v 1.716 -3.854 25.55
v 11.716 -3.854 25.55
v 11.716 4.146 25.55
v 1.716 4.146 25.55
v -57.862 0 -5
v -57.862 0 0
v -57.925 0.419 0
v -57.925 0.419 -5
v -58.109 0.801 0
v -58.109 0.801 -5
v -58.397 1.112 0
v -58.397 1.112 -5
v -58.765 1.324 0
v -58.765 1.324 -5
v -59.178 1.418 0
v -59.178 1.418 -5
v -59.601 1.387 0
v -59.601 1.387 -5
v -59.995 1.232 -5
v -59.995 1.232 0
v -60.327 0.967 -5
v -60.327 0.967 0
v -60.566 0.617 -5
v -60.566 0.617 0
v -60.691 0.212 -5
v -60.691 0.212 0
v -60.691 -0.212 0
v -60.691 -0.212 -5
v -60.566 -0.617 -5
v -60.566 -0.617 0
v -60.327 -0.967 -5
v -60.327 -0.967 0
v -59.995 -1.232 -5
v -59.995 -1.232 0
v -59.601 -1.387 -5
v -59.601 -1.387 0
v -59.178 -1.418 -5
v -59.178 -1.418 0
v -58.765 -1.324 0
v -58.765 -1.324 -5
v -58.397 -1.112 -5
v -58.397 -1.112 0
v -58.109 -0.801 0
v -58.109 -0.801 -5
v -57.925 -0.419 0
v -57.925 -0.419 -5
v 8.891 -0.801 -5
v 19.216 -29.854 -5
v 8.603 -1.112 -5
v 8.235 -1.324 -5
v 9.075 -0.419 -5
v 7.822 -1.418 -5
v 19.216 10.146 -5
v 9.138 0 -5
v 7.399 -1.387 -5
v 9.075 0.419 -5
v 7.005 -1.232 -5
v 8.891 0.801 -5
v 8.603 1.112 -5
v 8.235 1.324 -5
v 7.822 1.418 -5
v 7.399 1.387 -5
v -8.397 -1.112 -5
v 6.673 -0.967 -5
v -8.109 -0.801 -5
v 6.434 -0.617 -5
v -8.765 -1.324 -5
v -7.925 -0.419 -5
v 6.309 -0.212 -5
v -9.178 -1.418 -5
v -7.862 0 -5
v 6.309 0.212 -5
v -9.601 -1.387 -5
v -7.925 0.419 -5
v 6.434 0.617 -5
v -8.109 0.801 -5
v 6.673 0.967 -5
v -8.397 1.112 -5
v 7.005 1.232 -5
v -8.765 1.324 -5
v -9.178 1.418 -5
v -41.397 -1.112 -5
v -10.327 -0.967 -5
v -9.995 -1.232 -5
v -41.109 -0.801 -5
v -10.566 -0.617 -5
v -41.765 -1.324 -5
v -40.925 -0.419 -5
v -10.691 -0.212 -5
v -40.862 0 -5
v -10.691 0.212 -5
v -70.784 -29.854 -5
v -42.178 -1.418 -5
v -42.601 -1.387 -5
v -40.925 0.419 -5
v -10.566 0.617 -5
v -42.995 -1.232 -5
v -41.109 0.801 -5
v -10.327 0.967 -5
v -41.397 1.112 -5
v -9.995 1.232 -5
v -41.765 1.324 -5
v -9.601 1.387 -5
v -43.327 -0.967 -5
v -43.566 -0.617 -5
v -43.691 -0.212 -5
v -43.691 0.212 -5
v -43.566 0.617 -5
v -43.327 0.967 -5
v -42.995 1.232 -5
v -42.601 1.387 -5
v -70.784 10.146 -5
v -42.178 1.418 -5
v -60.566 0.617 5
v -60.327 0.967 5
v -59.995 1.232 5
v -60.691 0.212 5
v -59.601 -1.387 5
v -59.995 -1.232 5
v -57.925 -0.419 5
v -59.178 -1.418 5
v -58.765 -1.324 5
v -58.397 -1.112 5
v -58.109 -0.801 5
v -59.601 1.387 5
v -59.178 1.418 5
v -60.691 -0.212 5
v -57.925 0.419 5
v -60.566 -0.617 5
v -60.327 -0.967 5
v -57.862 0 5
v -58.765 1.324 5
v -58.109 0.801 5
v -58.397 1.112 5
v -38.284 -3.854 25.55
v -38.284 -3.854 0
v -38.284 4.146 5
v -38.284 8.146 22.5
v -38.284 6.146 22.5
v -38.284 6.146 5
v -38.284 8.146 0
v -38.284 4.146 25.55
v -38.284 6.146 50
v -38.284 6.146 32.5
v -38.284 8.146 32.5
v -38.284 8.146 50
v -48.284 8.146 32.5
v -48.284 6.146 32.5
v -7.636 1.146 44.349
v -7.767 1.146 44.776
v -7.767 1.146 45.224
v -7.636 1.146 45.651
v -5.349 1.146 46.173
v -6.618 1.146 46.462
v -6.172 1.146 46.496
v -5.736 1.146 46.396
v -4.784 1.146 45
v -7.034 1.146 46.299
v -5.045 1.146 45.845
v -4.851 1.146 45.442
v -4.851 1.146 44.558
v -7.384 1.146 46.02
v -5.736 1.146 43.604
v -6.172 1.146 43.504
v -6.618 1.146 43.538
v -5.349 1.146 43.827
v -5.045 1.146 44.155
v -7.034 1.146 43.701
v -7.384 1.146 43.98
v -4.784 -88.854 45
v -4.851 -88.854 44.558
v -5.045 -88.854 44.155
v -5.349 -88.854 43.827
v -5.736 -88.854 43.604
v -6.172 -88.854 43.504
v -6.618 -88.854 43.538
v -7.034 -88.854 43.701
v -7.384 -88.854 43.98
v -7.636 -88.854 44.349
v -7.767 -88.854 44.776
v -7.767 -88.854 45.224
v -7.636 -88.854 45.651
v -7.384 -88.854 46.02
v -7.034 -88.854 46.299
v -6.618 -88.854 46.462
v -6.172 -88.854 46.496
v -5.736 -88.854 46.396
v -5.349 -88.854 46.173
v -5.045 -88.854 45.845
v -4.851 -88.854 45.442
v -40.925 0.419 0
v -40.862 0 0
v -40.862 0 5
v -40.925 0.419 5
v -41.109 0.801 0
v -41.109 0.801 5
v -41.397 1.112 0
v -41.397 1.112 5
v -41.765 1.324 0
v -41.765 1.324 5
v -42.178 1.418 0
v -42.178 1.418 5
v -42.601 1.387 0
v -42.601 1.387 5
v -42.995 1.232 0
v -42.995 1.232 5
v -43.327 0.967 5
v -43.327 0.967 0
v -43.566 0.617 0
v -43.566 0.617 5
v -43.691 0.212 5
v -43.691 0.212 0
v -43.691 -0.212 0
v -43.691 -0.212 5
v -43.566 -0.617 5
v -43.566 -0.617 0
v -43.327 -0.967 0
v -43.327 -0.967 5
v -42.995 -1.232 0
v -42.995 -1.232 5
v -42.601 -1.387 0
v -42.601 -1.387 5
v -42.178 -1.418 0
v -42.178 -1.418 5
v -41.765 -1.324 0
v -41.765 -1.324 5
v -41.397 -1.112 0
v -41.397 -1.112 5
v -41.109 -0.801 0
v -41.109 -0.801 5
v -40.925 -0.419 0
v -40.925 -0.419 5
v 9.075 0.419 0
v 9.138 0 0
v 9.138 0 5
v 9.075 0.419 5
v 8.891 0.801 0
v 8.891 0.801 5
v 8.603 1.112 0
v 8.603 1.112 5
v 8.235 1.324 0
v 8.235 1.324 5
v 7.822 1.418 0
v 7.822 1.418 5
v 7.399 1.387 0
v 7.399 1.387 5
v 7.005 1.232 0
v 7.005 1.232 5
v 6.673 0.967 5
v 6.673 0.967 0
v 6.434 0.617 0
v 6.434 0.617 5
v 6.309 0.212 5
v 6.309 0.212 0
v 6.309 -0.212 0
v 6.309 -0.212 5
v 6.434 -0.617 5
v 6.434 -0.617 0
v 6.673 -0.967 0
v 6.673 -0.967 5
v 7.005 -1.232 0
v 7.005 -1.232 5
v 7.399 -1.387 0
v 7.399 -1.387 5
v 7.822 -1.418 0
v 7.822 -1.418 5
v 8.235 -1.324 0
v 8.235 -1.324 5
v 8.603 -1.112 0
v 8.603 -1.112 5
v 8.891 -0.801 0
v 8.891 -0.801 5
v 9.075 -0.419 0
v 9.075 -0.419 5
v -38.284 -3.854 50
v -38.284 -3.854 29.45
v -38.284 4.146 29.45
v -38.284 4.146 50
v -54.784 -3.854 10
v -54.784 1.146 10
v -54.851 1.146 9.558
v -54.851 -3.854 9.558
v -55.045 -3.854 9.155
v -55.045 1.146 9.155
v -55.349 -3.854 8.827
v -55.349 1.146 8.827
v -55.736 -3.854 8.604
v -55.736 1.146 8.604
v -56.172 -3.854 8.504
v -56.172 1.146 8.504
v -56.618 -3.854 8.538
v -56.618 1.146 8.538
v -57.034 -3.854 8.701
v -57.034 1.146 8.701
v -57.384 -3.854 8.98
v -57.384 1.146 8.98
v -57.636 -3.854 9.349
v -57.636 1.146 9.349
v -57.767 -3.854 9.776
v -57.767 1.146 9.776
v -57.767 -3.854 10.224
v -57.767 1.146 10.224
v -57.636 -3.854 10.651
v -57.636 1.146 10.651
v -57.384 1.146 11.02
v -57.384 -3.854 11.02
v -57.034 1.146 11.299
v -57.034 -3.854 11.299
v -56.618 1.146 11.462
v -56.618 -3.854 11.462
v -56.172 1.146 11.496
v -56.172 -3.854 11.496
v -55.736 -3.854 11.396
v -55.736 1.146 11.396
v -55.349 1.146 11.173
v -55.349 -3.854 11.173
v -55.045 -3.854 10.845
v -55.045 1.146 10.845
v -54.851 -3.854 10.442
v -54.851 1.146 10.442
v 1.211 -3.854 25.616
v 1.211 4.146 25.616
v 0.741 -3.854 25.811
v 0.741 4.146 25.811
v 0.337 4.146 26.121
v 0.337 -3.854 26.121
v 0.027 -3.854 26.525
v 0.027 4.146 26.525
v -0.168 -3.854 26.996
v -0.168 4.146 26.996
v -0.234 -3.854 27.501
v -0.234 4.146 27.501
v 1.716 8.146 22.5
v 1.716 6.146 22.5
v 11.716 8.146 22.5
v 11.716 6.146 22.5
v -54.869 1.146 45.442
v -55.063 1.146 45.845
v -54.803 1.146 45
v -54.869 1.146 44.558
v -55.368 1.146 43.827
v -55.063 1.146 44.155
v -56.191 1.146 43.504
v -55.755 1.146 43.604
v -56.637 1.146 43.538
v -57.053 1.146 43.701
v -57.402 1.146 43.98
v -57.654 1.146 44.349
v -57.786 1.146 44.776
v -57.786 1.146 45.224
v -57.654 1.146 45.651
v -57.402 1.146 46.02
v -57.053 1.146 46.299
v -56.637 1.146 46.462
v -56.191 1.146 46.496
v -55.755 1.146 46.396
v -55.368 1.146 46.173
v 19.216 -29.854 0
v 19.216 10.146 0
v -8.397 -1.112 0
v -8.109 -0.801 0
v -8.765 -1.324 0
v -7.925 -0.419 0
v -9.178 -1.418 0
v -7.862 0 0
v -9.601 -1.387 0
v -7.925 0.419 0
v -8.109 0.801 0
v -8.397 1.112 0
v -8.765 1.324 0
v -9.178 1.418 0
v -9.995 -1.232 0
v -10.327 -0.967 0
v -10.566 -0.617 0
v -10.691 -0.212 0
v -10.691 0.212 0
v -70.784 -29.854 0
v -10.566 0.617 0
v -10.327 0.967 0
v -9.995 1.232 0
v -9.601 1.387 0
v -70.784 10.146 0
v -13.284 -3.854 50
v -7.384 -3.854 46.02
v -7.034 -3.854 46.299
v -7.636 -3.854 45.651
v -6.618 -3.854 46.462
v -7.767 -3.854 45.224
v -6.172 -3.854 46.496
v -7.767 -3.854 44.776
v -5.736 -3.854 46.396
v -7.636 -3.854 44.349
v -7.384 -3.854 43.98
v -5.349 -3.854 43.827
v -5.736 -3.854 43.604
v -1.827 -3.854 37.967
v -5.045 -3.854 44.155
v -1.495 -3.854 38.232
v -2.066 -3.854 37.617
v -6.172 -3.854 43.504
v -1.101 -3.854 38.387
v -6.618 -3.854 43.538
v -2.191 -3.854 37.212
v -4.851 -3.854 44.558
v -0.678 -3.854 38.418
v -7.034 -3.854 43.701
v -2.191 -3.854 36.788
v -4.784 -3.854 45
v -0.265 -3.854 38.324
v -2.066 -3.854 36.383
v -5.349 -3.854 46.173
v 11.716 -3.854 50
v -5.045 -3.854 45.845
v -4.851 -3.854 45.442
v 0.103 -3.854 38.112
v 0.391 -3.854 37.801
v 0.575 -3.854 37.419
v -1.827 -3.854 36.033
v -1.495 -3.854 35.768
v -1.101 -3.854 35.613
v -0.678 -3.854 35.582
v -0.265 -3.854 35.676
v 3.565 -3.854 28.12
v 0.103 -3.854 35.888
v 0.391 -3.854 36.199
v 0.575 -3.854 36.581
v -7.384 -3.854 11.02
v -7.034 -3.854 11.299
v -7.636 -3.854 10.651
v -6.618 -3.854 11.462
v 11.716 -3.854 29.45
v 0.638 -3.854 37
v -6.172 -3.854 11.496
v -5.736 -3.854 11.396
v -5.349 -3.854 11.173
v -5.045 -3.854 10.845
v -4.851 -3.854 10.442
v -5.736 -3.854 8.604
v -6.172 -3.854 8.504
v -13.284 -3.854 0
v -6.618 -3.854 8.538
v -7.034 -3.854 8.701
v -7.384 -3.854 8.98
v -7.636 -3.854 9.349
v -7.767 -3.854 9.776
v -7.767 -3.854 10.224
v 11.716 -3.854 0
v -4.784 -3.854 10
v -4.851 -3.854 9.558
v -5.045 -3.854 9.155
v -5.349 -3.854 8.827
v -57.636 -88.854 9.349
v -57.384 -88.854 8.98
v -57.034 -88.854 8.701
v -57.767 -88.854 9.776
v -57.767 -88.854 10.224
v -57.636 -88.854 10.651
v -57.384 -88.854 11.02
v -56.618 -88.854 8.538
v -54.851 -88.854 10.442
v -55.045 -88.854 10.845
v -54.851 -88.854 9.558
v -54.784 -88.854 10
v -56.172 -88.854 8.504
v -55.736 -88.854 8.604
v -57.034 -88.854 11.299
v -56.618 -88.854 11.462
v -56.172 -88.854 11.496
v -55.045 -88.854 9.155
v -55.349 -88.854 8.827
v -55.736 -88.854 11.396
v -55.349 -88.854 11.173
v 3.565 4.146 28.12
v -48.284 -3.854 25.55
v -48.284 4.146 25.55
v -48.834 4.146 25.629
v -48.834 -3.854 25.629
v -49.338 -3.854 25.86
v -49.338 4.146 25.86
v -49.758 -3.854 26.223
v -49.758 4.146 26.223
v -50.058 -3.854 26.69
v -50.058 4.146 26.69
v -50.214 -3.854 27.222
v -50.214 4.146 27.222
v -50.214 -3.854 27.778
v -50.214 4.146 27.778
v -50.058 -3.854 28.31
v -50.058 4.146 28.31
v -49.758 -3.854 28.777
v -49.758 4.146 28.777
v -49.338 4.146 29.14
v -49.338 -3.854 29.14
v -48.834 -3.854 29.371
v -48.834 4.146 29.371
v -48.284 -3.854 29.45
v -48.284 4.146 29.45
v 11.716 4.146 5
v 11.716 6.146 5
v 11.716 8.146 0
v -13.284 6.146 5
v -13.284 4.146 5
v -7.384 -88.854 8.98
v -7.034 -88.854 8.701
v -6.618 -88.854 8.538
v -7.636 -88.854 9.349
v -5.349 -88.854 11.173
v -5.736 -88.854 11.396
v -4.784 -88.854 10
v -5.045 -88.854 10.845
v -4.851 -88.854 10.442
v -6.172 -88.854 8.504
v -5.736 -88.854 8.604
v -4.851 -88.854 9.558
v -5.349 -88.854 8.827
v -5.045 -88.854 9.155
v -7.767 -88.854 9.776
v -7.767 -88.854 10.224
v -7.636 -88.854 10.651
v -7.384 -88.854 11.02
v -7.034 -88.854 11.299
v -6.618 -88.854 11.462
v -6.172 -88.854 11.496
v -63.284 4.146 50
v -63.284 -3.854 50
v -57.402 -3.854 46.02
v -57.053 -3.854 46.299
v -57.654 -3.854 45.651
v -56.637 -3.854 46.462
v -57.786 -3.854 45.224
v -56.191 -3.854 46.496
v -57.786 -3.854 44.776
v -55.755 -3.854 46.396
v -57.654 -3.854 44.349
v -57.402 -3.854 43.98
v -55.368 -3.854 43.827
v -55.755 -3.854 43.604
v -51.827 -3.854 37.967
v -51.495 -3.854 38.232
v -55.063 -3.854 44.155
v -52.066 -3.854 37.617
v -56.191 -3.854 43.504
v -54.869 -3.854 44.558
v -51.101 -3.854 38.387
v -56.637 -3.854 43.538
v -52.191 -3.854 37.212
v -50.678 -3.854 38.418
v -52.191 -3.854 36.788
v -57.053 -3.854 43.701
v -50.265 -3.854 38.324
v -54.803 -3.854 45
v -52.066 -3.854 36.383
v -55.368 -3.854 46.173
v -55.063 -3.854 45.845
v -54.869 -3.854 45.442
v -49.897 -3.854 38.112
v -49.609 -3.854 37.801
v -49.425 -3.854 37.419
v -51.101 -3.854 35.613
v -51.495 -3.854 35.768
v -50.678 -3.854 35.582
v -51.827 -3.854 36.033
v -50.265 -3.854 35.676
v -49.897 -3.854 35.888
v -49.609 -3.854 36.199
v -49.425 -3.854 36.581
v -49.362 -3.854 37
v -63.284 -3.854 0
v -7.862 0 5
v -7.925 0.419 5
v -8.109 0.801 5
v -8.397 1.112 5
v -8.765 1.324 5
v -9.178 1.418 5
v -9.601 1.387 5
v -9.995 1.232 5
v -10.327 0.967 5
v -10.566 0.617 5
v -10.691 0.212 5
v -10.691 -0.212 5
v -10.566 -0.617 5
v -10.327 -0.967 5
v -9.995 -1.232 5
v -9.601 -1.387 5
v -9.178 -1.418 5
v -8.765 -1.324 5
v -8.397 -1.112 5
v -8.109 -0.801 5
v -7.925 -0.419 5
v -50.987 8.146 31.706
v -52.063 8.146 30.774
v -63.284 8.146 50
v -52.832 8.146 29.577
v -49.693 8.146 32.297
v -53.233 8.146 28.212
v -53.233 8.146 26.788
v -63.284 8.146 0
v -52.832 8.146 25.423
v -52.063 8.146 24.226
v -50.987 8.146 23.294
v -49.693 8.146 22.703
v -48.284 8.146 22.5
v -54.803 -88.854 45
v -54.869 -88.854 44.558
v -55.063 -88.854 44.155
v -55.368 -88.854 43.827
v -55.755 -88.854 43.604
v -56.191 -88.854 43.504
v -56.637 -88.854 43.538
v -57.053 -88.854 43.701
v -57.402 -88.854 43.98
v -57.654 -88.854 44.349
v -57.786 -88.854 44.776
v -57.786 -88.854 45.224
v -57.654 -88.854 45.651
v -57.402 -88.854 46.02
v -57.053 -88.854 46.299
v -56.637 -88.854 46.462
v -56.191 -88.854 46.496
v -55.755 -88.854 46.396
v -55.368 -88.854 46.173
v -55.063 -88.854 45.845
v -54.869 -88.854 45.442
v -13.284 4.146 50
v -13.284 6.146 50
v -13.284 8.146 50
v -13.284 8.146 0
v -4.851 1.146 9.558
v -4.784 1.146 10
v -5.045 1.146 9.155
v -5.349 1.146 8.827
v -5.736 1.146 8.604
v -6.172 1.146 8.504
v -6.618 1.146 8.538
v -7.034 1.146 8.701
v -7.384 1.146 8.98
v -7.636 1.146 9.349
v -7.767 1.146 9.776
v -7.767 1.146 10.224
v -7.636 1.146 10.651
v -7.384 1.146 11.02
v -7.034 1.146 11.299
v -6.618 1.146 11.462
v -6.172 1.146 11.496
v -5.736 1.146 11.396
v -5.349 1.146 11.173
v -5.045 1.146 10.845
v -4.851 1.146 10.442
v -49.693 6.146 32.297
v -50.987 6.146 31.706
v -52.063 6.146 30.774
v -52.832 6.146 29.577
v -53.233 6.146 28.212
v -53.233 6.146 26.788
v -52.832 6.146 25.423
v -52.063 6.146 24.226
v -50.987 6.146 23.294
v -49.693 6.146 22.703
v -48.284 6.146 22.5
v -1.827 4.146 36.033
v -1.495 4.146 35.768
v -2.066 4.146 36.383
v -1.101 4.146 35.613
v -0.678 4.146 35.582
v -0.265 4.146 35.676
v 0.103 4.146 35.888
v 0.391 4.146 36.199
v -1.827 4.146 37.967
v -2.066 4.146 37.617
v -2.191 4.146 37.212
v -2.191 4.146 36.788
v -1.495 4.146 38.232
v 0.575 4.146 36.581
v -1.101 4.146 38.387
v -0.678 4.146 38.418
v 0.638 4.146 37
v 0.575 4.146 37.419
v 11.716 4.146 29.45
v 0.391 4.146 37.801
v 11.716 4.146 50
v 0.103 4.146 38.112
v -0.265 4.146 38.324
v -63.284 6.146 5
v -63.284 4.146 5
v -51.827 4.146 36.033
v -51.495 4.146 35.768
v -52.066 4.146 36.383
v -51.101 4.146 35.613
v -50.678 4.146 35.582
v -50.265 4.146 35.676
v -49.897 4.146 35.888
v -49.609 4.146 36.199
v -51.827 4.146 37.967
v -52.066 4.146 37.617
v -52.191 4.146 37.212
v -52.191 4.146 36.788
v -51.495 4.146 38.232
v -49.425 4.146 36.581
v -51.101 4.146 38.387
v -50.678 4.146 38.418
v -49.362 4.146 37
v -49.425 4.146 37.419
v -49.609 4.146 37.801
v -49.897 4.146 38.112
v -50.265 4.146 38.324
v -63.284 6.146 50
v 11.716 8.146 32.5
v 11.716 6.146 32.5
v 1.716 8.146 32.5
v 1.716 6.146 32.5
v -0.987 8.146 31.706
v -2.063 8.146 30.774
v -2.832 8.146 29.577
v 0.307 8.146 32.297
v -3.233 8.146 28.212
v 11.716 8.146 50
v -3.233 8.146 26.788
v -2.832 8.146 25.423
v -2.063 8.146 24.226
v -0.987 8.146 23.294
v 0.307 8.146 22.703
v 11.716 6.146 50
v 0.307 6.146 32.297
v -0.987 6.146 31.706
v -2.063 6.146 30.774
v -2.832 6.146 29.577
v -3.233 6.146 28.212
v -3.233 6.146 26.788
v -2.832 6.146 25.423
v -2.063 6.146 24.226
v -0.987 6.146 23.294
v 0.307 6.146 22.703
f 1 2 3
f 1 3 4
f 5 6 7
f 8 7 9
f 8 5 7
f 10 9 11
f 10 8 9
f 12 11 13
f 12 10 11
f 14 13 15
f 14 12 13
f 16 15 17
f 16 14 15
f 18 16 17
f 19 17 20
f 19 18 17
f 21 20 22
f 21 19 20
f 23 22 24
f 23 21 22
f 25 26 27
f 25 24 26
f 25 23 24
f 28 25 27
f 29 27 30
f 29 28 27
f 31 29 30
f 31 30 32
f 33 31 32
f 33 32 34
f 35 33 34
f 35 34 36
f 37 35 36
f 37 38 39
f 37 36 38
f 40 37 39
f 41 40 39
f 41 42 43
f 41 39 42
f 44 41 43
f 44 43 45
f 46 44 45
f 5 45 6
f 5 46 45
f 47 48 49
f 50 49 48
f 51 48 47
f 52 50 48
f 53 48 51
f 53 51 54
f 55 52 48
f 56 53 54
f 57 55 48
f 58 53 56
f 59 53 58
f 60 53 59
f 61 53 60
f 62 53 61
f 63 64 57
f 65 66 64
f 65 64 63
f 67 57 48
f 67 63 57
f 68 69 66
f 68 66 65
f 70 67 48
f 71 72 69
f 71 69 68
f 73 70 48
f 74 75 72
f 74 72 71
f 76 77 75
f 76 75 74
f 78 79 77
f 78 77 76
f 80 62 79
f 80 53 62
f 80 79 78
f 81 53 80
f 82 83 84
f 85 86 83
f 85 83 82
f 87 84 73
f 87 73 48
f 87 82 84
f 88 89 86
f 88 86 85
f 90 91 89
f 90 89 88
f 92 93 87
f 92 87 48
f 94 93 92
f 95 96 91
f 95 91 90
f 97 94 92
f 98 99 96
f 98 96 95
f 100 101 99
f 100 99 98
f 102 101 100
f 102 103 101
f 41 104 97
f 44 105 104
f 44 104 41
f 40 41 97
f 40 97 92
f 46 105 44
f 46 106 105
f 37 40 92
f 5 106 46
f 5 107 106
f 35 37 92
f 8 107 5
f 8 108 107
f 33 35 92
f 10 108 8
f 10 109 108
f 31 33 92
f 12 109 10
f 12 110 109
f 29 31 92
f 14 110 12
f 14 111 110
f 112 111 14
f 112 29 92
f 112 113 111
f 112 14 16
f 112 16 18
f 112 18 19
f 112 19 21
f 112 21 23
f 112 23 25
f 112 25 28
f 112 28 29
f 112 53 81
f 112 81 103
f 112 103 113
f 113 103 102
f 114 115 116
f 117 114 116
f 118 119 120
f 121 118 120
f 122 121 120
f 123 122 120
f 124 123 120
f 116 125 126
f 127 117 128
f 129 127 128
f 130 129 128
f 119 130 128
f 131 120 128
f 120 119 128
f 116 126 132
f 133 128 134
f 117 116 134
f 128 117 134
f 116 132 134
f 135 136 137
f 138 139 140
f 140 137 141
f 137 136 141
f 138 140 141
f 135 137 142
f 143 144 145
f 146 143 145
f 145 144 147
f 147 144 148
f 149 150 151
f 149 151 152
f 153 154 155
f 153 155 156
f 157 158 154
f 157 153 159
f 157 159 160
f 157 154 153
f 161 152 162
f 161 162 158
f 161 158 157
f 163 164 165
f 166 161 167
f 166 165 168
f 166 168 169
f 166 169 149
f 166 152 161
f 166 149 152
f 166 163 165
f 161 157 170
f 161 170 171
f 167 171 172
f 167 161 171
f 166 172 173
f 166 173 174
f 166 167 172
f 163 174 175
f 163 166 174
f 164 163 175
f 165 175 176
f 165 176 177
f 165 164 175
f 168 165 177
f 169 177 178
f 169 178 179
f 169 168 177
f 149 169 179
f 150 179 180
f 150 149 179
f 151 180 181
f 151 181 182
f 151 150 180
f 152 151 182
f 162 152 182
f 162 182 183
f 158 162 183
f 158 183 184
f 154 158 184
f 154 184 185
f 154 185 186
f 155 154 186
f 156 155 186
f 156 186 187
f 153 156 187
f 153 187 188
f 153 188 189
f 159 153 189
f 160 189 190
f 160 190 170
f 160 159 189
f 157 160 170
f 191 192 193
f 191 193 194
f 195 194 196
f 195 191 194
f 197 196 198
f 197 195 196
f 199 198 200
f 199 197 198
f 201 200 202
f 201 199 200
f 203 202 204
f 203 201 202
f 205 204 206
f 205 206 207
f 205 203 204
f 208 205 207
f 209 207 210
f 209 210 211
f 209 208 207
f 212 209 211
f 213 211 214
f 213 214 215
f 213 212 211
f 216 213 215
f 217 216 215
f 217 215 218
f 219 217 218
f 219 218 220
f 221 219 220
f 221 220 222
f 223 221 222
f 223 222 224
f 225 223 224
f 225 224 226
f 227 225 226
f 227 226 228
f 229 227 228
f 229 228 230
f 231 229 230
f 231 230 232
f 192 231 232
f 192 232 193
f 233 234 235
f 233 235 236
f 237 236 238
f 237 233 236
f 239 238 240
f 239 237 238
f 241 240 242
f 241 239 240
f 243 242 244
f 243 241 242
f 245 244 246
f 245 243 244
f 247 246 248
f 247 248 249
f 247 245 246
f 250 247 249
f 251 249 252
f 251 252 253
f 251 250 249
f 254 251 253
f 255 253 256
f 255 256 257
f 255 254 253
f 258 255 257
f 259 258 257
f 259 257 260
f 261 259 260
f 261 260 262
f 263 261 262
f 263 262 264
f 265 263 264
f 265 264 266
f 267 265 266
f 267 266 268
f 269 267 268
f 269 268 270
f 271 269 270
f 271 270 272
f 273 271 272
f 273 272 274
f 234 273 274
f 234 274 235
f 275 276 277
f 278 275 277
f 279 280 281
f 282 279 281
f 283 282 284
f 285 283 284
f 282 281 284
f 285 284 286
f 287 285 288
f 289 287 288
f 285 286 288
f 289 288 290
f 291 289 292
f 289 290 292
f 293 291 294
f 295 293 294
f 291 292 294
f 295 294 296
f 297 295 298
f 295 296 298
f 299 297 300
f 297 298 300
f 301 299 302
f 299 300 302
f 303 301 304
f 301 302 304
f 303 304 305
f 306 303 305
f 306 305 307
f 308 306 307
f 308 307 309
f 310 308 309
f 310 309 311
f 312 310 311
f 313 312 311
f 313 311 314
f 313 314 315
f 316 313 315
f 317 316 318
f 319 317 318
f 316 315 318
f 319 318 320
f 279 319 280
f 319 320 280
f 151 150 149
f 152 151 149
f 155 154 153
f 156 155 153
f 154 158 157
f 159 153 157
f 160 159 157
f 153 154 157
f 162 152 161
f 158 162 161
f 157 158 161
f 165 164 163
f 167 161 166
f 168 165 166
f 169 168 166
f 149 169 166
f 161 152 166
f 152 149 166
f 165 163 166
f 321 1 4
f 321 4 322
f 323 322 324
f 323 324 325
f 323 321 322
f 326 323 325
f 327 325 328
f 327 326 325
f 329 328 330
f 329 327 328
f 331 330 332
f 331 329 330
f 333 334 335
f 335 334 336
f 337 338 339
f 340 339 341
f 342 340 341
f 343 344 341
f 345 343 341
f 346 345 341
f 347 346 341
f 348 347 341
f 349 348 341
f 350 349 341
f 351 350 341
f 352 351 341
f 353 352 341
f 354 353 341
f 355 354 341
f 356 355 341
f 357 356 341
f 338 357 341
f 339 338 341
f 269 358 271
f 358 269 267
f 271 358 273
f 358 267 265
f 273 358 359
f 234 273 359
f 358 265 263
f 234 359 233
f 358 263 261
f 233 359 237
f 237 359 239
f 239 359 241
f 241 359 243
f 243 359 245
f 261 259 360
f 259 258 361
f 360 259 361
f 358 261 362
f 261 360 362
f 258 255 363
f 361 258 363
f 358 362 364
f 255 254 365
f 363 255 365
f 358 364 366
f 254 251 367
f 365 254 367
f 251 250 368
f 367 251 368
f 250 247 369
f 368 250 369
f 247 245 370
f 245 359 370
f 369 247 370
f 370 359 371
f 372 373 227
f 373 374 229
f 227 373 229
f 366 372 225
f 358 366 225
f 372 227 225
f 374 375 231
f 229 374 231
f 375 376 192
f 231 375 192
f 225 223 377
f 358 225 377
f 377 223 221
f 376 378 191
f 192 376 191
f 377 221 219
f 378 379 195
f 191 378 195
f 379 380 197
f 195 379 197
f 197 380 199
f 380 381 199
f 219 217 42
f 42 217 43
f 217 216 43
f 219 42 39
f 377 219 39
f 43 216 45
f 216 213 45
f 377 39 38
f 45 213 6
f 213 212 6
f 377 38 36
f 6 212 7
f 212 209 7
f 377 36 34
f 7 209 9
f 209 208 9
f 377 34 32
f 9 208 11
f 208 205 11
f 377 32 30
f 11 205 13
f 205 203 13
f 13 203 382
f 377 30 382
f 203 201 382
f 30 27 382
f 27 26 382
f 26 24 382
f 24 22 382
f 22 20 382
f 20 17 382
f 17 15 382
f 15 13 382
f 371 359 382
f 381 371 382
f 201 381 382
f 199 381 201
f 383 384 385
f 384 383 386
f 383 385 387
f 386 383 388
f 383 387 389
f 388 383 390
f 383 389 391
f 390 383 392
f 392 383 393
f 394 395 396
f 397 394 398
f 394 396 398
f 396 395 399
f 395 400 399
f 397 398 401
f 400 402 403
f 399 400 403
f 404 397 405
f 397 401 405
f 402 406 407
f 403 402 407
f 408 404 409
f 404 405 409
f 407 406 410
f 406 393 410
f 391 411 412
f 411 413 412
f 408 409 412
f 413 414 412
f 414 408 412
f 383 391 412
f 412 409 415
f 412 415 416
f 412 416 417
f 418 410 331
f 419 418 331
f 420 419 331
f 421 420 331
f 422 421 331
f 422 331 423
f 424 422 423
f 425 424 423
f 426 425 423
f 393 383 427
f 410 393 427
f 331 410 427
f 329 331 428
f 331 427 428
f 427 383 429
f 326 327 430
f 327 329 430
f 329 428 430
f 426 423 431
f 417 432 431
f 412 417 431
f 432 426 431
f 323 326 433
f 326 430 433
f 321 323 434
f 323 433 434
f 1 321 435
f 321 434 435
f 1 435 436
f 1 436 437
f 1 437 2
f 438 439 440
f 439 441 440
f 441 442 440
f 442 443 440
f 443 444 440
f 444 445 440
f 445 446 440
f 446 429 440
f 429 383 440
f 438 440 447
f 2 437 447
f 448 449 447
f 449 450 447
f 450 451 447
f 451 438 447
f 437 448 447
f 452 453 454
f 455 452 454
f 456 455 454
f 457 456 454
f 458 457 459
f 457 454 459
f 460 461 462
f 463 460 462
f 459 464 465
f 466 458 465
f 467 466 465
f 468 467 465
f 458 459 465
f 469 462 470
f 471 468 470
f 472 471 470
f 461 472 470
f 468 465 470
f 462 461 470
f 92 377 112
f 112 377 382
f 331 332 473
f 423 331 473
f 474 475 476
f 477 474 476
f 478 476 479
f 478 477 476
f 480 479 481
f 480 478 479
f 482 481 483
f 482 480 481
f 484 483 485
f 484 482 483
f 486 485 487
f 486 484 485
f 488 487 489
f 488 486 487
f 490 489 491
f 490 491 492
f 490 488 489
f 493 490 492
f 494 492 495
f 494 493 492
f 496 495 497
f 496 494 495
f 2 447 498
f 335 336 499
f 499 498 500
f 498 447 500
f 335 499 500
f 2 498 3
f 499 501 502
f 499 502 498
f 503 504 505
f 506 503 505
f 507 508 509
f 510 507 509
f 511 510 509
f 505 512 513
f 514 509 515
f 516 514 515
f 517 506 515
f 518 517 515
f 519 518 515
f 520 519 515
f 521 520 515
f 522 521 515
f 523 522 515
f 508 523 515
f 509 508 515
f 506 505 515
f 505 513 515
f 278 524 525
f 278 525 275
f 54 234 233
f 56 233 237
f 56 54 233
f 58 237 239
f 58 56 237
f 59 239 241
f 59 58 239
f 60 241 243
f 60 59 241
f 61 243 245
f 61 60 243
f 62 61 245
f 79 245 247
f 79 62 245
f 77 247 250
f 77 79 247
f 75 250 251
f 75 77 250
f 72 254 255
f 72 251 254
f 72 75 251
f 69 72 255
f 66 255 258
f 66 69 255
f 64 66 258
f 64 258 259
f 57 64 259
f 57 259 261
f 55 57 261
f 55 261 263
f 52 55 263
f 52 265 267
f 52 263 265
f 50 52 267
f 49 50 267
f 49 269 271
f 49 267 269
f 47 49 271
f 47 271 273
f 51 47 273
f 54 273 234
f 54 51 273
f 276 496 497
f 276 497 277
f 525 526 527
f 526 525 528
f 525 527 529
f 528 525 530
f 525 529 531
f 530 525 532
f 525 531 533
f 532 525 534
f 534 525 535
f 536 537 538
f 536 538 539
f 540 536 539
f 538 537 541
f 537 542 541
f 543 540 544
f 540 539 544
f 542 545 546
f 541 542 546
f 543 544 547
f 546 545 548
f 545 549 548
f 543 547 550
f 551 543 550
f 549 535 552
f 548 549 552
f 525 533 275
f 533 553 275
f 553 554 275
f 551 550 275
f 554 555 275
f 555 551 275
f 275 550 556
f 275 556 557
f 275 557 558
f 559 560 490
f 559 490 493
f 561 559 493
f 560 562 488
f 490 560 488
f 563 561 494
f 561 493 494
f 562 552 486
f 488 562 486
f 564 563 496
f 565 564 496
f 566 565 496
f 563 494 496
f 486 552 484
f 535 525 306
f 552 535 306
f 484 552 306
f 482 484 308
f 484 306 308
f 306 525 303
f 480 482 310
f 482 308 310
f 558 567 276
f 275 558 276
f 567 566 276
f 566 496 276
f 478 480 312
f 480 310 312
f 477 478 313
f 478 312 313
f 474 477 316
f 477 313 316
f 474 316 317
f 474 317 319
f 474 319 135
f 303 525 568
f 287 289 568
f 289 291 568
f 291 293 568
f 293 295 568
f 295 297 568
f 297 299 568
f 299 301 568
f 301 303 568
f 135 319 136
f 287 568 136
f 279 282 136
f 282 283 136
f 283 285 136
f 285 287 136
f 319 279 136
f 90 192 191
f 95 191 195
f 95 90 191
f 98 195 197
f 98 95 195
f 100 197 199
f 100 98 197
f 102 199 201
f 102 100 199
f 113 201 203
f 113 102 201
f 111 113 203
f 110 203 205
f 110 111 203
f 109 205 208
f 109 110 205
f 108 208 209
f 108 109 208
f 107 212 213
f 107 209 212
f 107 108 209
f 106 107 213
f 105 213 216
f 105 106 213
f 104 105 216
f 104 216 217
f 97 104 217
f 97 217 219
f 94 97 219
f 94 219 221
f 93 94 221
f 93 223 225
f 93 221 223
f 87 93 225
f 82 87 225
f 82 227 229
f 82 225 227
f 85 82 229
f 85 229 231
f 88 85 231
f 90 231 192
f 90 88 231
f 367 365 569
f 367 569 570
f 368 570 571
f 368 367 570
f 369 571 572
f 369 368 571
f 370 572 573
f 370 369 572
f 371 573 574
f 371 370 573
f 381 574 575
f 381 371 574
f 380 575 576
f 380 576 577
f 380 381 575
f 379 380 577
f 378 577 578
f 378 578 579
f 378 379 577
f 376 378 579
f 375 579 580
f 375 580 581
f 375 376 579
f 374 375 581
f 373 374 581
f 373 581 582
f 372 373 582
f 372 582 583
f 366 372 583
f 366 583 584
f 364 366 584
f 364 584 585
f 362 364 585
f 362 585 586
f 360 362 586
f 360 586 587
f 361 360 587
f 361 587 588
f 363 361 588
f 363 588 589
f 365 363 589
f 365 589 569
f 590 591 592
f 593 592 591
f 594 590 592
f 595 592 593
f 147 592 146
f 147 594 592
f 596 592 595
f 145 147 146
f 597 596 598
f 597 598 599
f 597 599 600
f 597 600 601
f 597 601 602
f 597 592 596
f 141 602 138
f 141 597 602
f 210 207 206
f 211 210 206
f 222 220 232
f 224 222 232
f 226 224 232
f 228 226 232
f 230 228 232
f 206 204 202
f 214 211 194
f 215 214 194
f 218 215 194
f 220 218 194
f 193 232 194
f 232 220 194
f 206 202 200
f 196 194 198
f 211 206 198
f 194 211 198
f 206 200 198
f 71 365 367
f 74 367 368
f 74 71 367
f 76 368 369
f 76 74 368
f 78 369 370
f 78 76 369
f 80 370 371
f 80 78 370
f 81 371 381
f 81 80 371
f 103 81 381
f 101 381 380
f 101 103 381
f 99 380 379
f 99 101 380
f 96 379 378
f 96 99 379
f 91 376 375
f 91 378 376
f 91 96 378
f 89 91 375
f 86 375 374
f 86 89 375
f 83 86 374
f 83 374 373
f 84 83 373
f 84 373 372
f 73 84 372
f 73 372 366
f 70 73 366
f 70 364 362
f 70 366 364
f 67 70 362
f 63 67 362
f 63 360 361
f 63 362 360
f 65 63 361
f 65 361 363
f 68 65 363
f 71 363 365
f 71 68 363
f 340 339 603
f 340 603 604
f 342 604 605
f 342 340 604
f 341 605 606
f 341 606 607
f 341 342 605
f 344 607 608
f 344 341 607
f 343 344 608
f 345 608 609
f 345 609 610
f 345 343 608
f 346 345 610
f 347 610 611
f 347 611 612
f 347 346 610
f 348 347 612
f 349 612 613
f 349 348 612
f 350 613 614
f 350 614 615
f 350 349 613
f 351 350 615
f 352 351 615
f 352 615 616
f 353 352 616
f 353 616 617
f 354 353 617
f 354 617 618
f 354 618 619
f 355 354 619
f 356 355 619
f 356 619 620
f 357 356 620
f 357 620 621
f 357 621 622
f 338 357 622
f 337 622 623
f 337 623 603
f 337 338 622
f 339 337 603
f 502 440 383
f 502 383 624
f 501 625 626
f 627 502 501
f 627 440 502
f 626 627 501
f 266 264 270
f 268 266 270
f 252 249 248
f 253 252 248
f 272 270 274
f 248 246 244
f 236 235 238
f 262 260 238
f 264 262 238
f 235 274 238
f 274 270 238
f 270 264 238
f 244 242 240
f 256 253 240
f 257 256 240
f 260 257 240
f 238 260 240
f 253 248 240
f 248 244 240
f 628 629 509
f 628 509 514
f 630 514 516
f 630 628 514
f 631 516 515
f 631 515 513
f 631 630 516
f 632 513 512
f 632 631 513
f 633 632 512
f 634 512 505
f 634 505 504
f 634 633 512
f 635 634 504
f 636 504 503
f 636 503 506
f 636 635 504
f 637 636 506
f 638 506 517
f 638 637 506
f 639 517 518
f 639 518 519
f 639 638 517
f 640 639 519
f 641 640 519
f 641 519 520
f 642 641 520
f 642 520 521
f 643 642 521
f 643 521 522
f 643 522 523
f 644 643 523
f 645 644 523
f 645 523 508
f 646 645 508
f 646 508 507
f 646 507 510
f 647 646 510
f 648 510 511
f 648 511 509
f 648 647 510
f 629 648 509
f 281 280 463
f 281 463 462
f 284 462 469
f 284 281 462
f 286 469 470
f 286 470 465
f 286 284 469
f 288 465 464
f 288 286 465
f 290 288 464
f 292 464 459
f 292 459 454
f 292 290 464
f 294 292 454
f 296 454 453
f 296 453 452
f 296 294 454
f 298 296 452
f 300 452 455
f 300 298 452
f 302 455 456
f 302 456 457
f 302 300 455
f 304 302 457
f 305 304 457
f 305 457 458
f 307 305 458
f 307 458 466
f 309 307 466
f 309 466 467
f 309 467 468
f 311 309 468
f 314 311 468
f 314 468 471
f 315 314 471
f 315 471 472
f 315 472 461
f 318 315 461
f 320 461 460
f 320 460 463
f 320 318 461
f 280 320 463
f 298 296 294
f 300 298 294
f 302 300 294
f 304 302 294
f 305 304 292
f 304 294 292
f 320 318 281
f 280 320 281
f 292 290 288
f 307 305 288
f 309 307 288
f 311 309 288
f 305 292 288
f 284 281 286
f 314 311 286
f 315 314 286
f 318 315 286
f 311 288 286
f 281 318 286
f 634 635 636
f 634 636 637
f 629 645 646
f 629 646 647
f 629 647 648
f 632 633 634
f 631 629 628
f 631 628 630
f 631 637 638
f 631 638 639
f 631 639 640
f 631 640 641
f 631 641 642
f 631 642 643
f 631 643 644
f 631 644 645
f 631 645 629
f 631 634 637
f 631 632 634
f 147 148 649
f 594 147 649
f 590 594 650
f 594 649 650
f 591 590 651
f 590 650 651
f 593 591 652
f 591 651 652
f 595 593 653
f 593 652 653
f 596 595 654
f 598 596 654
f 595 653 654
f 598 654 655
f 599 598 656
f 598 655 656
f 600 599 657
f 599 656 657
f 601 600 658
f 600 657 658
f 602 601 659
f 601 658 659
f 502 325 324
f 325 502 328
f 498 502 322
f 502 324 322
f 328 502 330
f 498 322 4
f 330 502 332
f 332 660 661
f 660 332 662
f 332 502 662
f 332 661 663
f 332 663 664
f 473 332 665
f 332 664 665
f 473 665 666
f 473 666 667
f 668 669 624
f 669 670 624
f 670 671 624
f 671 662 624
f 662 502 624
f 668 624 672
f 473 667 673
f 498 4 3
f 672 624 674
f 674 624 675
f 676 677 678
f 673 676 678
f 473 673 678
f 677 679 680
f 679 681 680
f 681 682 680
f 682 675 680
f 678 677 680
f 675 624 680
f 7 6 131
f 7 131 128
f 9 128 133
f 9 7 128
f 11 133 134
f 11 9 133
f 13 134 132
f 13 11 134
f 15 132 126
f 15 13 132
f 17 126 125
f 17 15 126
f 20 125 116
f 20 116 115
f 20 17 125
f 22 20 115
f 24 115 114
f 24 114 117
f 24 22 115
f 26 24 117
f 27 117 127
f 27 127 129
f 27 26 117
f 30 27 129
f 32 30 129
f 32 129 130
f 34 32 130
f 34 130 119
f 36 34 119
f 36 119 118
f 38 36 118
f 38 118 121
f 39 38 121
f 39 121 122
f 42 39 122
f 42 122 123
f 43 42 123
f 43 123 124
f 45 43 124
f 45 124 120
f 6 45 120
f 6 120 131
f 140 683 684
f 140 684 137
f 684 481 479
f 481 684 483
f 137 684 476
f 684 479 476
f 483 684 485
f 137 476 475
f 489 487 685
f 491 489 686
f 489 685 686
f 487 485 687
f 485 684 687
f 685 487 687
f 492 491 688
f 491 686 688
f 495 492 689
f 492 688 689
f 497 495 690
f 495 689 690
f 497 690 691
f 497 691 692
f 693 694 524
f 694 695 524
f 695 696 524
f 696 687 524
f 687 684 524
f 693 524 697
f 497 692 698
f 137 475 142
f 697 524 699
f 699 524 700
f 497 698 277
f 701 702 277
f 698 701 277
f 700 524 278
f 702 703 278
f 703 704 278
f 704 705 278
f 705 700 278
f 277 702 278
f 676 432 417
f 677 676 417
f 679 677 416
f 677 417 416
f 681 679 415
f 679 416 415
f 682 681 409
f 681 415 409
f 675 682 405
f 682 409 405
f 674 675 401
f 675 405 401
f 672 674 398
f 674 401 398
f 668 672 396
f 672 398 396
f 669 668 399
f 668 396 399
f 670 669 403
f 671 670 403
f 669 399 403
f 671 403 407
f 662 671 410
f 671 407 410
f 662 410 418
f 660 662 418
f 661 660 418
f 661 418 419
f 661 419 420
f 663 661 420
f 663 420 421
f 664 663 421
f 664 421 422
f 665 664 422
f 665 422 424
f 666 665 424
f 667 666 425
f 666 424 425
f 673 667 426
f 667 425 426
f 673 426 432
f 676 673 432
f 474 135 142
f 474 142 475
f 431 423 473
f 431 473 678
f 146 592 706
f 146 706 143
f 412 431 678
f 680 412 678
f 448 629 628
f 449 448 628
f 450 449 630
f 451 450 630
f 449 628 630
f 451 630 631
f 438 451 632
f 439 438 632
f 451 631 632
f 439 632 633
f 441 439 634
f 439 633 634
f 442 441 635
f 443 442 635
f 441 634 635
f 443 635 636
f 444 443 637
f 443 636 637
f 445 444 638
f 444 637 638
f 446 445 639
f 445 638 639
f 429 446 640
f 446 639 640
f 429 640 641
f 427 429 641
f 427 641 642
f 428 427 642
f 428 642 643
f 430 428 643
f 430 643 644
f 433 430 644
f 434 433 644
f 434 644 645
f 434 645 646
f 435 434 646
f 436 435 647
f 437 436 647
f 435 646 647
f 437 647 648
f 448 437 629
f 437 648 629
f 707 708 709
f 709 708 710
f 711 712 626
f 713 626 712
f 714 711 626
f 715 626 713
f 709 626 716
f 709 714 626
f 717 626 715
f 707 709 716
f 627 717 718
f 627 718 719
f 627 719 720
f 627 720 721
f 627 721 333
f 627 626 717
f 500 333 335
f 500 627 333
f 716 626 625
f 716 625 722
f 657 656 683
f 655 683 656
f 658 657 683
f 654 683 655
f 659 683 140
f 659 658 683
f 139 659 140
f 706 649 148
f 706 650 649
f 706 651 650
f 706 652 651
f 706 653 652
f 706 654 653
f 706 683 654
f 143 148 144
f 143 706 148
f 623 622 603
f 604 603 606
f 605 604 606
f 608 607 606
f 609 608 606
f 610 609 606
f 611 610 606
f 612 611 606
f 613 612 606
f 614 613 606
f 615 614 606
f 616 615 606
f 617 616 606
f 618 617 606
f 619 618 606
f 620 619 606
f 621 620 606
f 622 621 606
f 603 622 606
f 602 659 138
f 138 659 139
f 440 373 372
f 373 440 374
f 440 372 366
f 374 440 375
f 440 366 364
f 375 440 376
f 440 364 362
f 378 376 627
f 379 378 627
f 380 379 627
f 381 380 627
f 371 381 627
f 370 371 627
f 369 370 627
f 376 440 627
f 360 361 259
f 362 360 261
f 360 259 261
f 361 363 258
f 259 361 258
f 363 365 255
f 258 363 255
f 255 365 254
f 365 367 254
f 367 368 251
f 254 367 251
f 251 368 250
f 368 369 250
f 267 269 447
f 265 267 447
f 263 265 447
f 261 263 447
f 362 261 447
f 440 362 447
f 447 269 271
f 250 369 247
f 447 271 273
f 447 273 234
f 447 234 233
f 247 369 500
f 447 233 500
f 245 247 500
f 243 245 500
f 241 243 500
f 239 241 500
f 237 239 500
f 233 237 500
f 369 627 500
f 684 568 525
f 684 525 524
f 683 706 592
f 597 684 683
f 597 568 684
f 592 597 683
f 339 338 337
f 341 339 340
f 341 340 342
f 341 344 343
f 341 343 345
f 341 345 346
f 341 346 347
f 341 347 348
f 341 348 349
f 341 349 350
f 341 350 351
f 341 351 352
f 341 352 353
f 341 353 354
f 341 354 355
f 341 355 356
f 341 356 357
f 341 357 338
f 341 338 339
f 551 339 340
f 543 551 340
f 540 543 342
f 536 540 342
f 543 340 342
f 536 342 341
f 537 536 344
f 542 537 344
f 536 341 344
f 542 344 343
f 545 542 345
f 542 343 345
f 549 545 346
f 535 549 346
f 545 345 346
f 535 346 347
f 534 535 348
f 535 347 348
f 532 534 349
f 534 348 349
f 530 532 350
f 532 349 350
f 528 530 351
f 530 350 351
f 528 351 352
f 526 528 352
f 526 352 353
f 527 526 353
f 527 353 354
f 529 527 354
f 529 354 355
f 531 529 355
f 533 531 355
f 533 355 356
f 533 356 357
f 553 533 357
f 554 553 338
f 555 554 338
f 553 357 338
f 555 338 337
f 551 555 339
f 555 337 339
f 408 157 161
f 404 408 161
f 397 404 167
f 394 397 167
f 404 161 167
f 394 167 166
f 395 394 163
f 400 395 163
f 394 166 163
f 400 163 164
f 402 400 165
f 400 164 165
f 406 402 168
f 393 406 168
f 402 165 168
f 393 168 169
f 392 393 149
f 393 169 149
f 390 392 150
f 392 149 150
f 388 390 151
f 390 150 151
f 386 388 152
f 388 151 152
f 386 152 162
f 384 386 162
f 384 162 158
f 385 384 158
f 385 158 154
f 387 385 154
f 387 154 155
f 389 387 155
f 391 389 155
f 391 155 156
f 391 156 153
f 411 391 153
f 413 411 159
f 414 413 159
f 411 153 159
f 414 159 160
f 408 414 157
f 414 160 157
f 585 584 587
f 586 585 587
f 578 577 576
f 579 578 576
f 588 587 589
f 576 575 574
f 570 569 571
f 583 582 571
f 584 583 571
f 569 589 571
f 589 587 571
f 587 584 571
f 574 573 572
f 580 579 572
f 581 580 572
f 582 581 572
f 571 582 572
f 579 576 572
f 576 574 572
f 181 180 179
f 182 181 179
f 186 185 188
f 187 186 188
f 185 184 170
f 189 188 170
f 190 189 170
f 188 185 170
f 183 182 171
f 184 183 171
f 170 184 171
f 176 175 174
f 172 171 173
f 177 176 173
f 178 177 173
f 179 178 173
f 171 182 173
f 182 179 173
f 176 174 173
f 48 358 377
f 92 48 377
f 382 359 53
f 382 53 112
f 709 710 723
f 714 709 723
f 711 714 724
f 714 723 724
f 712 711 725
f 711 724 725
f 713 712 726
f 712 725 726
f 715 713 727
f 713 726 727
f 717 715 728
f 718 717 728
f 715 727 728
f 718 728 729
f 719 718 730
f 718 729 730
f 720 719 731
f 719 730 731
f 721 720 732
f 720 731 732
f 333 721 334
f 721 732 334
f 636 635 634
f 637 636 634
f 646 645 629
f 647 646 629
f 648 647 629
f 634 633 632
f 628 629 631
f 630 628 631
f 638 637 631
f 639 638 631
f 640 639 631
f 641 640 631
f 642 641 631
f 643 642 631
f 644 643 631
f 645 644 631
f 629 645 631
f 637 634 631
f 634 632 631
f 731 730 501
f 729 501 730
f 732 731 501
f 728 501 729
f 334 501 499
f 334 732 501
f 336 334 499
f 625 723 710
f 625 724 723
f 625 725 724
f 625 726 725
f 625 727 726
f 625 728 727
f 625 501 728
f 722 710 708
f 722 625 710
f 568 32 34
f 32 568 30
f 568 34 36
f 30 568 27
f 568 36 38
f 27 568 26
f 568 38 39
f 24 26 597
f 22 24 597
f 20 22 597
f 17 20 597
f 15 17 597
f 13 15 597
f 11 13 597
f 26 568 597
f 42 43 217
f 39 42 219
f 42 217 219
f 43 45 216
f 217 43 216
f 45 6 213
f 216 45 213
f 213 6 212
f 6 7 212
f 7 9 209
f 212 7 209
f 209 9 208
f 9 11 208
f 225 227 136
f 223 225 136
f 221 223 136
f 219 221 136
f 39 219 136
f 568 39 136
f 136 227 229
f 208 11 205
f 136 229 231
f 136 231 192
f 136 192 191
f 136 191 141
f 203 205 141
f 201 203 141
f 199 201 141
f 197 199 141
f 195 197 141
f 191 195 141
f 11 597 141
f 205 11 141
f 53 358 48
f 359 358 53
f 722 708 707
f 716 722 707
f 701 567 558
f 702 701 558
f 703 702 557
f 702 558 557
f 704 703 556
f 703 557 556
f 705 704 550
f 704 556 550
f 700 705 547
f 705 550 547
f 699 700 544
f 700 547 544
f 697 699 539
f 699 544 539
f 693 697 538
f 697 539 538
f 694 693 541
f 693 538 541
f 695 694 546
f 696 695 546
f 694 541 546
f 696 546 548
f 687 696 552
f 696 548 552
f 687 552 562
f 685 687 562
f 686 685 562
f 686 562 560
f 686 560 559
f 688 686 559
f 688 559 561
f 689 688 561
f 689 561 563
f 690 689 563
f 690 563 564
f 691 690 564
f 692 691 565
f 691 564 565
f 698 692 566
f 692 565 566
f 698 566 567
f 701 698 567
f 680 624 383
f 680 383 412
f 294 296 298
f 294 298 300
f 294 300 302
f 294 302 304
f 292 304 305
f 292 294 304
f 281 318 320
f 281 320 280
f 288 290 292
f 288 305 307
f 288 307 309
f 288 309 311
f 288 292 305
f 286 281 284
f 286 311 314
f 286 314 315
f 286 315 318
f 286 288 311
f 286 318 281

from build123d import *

# Parameters (mm, degrees)
SKETCH1_W             = 25
SKETCH1_H             = 12
BOSS_EXTRUDE1_DEPTH   = 50
SKETCH2_W             = 25
SKETCH2_H             = 2
CUT_EXTRUDE1_DEPTH    = 45
SKETCH4_R             = 1.4224
CUT_EXTRUDE2_DEPTH    = 8
CUT_EXTRUDE3_DEPTH    = 2
LPATTERN1_COUNT       = 2
LPATTERN1_PITCH       = 50
SKETCH7_W             = 90
SKETCH7_H             = 40
BOSS_EXTRUDE2_DEPTH   = 5
CUT_EXTRUDE4_START    = -55
SKETCH8_R             = 1.4224
CUT_EXTRUDE4_DEPTH    = 10
CUT_EXTRUDE5_START    = -55
SKETCH9_R             = 1.4224
CUT_EXTRUDE5_DEPTH    = 10
BOSS_EXTRUDE3_START   = -7
SKETCH10_R            = 1.5
BOSS_EXTRUDE3_DEPTH   = 90
BOSS_EXTRUDE3_2_DEPTH = 90
CUT_EXTRUDE6_START    = -7
SKETCH10_3_R          = 1.5
CUT_EXTRUDE6_DEPTH    = 5
BOSS_EXTRUDE4_START   = -7
SKETCH11_R            = 1.5
BOSS_EXTRUDE4_DEPTH   = 90
BOSS_EXTRUDE4_2_DEPTH = 90
CUT_EXTRUDE7_START    = -7
SKETCH11_5_R          = 1.5
CUT_EXTRUDE7_DEPTH    = 5
CUT_EXTRUDE8_START    = -12
CUT_EXTRUDE8_DEPTH    = 8
CUT_EXTRUDE9_START    = -12
CUT_EXTRUDE9_DEPTH    = 8


with BuildPart() as part:
    # Sketch1 → Boss-Extrude1 (new body)
    with BuildSketch(Plane.XY):
        with Locations((-50.784177629, 2.145908792)):
            Rectangle(SKETCH1_W, SKETCH1_H)
    extrude(amount=BOSS_EXTRUDE1_DEPTH)

    # Sketch2 → Cut-Extrude1 (cut)
    with BuildSketch(Plane.XY.offset(50)):
        with Locations((-50.784177629, 5.145908792)):
            Rectangle(SKETCH2_W, SKETCH2_H)
    extrude(amount=-CUT_EXTRUDE1_DEPTH, mode=Mode.SUBTRACT)

    # Sketch4 → Cut-Extrude2 (cut)
    with BuildSketch(Plane.XZ.offset(3.854091208)):
        with Locations((-50.784177629, 37)):
            Circle(SKETCH4_R)
    extrude(amount=-CUT_EXTRUDE2_DEPTH, mode=Mode.SUBTRACT)

    # Sketch6 → Cut-Extrude3 (cut)
    with BuildSketch(Plane.XZ.offset(-6.145908792)):
        with BuildLine():
            Line((-38.284177629, 32.5), (-48.284177629, 32.5))
            ThreePointArc((-48.284177629, 32.5), (-44.748643723, 31.035533906), (-43.284177629, 27.5))
            ThreePointArc((-43.284177629, 27.5), (-44.748643723, 23.964466094), (-48.284177629, 22.5))
            Line((-48.284177629, 22.5), (-38.284177629, 22.5))
            Line((-38.284177629, 22.5), (-38.284177629, 32.5))
        make_face()
        with BuildLine():
            ThreePointArc((-43.284177629, 27.5), (-44.748643723, 31.035533906), (-48.284177629, 32.5))
            Line((-48.284177629, 32.5), (-48.284177629, 22.5))
            ThreePointArc((-48.284177629, 22.5), (-44.748643723, 23.964466094), (-43.284177629, 27.5))
        make_face()
        with BuildLine():
            Line((-48.284177629, 22.5), (-48.284177629, 32.5))
            ThreePointArc((-48.284177629, 32.5), (-53.284177629, 27.5), (-48.284177629, 22.5))
        make_face()
    extrude(amount=-CUT_EXTRUDE3_DEPTH, mode=Mode.SUBTRACT)


with BuildPart() as lpattern1_1:
    # LPattern1: pattern copy
    add(part.part.moved(Location(Vector(1, 0, 0) * (1 * LPATTERN1_PITCH))))


with BuildPart() as body_3:
    # Sketch7 → Boss-Extrude2 (new body)
    with BuildSketch(Plane(origin=(0, 0, 0), x_dir=(-1, 0, 0), z_dir=(0, 0, -1))):
        with Locations((25.784177629, -9.854091208)):
            Rectangle(SKETCH7_W, SKETCH7_H)
    extrude(amount=BOSS_EXTRUDE2_DEPTH)


with BuildPart() as cut_extrude4_tool:
    # Sketch8 → Cut-Extrude4 (new body)
    with BuildSketch(Plane.XY.offset(50).offset(CUT_EXTRUDE4_START)):
        with Locations((-59.284177629, 0)):
            Circle(SKETCH8_R)
        with Locations((-42.284177629, 0)):
            Circle(SKETCH8_R)
    extrude(amount=CUT_EXTRUDE4_DEPTH)


with BuildPart() as part_1:
    add(part.part)

    # Cut-Extrude4: cut by cut_extrude4_tool
    add(cut_extrude4_tool.part, mode=Mode.SUBTRACT)

    # Sketch10<3> → Cut-Extrude6 (cut)
    with BuildSketch(Plane(origin=(0, 8.145908792, 0), x_dir=(1, 0, 0), z_dir=(0, 1, 0)).offset(CUT_EXTRUDE6_START)):
        with Locations((-56.284177629, -10)):
            Circle(SKETCH10_3_R)
        with Locations((-56.302755809, -45)):
            Circle(SKETCH10_3_R)
    extrude(amount=-CUT_EXTRUDE6_DEPTH, mode=Mode.SUBTRACT)

    # Sketch12 → Cut-Extrude8 (cut)
    with BuildSketch(Plane(origin=(0, 8.145908792, 0), x_dir=(1, 0, 0), z_dir=(0, 1, 0)).offset(CUT_EXTRUDE8_START)):
        with BuildLine():
            Line((-38.284177629, -25.55), (-48.284177629, -25.55))
            ThreePointArc((-48.284177629, -25.55), (-46.905319405, -26.121141777), (-46.334177629, -27.5))
            ThreePointArc((-46.334177629, -27.5), (-46.905319405, -28.878858223), (-48.284177629, -29.45))
            Line((-48.284177629, -29.45), (-38.284177629, -29.45))
            Line((-38.284177629, -29.45), (-38.284177629, -25.55))
        make_face()
        with BuildLine():
            ThreePointArc((-46.334177629, -27.5), (-46.905319405, -26.121141777), (-48.284177629, -25.55))
            Line((-48.284177629, -25.55), (-48.284177629, -29.45))
            ThreePointArc((-48.284177629, -29.45), (-46.905319405, -28.878858223), (-46.334177629, -27.5))
        make_face()
        with BuildLine():
            Line((-48.284177629, -29.45), (-48.284177629, -25.55))
            ThreePointArc((-48.284177629, -25.55), (-50.234177629, -27.5), (-48.284177629, -29.45))
        make_face()
    extrude(amount=CUT_EXTRUDE8_DEPTH, mode=Mode.SUBTRACT)


with BuildPart() as body_3_1:
    add(body_3.part)

    # Cut-Extrude4: cut by cut_extrude4_tool
    add(cut_extrude4_tool.part, mode=Mode.SUBTRACT)


with BuildPart() as cut_extrude5_tool:
    # Sketch9 → Cut-Extrude5 (new body)
    with BuildSketch(Plane.XY.offset(50).offset(CUT_EXTRUDE5_START)):
        with Locations((-9.284177629, 0)):
            Circle(SKETCH9_R)
        with Locations((7.715822371, 0)):
            Circle(SKETCH9_R)
    extrude(amount=CUT_EXTRUDE5_DEPTH)


with BuildPart() as lpattern1_1_1:
    add(lpattern1_1.part)

    # Cut-Extrude5: cut by cut_extrude5_tool
    add(cut_extrude5_tool.part, mode=Mode.SUBTRACT)

    # Sketch11<5> → Cut-Extrude7 (cut)
    with BuildSketch(Plane(origin=(0, 8.145908792, 0), x_dir=(1, 0, 0), z_dir=(0, 1, 0)).offset(CUT_EXTRUDE7_START)):
        with Locations((-6.284177629, -10)):
            Circle(SKETCH11_5_R)
        with Locations((-6.284177629, -45)):
            Circle(SKETCH11_5_R)
    extrude(amount=-CUT_EXTRUDE7_DEPTH, mode=Mode.SUBTRACT)

    # Sketch13 → Cut-Extrude9 (cut)
    with BuildSketch(Plane(origin=(0, 8.145908792, 0), x_dir=(1, 0, 0), z_dir=(0, 1, 0)).offset(CUT_EXTRUDE9_START)):
        with BuildLine():
            Line((11.715822371, -25.55), (1.715822371, -25.55))
            ThreePointArc((1.715822371, -25.55), (3.094680595, -26.121141777), (3.665822371, -27.5))
            ThreePointArc((3.665822371, -27.5), (3.640329438, -27.814281006), (3.564517191, -28.120344633))
            Line((3.564517191, -28.120344633), (11.715822371, -29.45))
            Line((11.715822371, -29.45), (11.715822371, -25.55))
        make_face()
        with BuildLine():
            ThreePointArc((3.665822371, -27.5), (3.094680595, -26.121141777), (1.715822371, -25.55))
            Line((1.715822371, -25.55), (-0.234177505, -27.500694813))
            Line((-0.234177505, -27.500694813), (3.564517191, -28.120344633))
            ThreePointArc((3.564517191, -28.120344633), (3.640329438, -27.814281006), (3.665822371, -27.5))
        make_face()
        with BuildLine():
            Line((-0.234177505, -27.500694813), (1.715822371, -25.55))
            ThreePointArc((1.715822371, -25.55), (0.336718516, -26.121387452), (-0.234177505, -27.500694813))
        make_face()
    extrude(amount=CUT_EXTRUDE9_DEPTH, mode=Mode.SUBTRACT)


with BuildPart() as body_3_2:
    add(body_3_1.part)

    # Cut-Extrude5: cut by cut_extrude5_tool
    add(cut_extrude5_tool.part, mode=Mode.SUBTRACT)


with BuildPart() as body_4:
    # Sketch10 → Boss-Extrude3 (new body)
    with BuildSketch(Plane(origin=(0, 8.145908792, 0), x_dir=(1, 0, 0), z_dir=(0, 1, 0)).offset(BOSS_EXTRUDE3_START)):
        with Locations((-56.284177629, -10)):
            Circle(SKETCH10_R)
    extrude(amount=-BOSS_EXTRUDE3_DEPTH)


with BuildPart() as body_5:
    # Sketch10 → Boss-Extrude3 2 (new body)
    with BuildSketch(Plane(origin=(0, 8.145908792, 0), x_dir=(1, 0, 0), z_dir=(0, 1, 0)).offset(BOSS_EXTRUDE3_START)):
        with Locations((-56.302755809, -45)):
            Circle(SKETCH10_R)
    extrude(amount=-BOSS_EXTRUDE3_2_DEPTH)


with BuildPart() as body_6:
    # Sketch11 → Boss-Extrude4 (new body)
    with BuildSketch(Plane(origin=(0, 8.145908792, 0), x_dir=(1, 0, 0), z_dir=(0, 1, 0)).offset(BOSS_EXTRUDE4_START)):
        with Locations((-6.284177629, -10)):
            Circle(SKETCH11_R)
    extrude(amount=-BOSS_EXTRUDE4_DEPTH)


with BuildPart() as body_7:
    # Sketch11 → Boss-Extrude4 2 (new body)
    with BuildSketch(Plane(origin=(0, 8.145908792, 0), x_dir=(1, 0, 0), z_dir=(0, 1, 0)).offset(BOSS_EXTRUDE4_START)):
        with Locations((-6.284177629, -45)):
            Circle(SKETCH11_R)
    extrude(amount=-BOSS_EXTRUDE4_2_DEPTH)


solid = Compound([part_1.part, lpattern1_1_1.part, body_3_2.part, body_4.part, body_5.part, body_6.part, body_7.part])
